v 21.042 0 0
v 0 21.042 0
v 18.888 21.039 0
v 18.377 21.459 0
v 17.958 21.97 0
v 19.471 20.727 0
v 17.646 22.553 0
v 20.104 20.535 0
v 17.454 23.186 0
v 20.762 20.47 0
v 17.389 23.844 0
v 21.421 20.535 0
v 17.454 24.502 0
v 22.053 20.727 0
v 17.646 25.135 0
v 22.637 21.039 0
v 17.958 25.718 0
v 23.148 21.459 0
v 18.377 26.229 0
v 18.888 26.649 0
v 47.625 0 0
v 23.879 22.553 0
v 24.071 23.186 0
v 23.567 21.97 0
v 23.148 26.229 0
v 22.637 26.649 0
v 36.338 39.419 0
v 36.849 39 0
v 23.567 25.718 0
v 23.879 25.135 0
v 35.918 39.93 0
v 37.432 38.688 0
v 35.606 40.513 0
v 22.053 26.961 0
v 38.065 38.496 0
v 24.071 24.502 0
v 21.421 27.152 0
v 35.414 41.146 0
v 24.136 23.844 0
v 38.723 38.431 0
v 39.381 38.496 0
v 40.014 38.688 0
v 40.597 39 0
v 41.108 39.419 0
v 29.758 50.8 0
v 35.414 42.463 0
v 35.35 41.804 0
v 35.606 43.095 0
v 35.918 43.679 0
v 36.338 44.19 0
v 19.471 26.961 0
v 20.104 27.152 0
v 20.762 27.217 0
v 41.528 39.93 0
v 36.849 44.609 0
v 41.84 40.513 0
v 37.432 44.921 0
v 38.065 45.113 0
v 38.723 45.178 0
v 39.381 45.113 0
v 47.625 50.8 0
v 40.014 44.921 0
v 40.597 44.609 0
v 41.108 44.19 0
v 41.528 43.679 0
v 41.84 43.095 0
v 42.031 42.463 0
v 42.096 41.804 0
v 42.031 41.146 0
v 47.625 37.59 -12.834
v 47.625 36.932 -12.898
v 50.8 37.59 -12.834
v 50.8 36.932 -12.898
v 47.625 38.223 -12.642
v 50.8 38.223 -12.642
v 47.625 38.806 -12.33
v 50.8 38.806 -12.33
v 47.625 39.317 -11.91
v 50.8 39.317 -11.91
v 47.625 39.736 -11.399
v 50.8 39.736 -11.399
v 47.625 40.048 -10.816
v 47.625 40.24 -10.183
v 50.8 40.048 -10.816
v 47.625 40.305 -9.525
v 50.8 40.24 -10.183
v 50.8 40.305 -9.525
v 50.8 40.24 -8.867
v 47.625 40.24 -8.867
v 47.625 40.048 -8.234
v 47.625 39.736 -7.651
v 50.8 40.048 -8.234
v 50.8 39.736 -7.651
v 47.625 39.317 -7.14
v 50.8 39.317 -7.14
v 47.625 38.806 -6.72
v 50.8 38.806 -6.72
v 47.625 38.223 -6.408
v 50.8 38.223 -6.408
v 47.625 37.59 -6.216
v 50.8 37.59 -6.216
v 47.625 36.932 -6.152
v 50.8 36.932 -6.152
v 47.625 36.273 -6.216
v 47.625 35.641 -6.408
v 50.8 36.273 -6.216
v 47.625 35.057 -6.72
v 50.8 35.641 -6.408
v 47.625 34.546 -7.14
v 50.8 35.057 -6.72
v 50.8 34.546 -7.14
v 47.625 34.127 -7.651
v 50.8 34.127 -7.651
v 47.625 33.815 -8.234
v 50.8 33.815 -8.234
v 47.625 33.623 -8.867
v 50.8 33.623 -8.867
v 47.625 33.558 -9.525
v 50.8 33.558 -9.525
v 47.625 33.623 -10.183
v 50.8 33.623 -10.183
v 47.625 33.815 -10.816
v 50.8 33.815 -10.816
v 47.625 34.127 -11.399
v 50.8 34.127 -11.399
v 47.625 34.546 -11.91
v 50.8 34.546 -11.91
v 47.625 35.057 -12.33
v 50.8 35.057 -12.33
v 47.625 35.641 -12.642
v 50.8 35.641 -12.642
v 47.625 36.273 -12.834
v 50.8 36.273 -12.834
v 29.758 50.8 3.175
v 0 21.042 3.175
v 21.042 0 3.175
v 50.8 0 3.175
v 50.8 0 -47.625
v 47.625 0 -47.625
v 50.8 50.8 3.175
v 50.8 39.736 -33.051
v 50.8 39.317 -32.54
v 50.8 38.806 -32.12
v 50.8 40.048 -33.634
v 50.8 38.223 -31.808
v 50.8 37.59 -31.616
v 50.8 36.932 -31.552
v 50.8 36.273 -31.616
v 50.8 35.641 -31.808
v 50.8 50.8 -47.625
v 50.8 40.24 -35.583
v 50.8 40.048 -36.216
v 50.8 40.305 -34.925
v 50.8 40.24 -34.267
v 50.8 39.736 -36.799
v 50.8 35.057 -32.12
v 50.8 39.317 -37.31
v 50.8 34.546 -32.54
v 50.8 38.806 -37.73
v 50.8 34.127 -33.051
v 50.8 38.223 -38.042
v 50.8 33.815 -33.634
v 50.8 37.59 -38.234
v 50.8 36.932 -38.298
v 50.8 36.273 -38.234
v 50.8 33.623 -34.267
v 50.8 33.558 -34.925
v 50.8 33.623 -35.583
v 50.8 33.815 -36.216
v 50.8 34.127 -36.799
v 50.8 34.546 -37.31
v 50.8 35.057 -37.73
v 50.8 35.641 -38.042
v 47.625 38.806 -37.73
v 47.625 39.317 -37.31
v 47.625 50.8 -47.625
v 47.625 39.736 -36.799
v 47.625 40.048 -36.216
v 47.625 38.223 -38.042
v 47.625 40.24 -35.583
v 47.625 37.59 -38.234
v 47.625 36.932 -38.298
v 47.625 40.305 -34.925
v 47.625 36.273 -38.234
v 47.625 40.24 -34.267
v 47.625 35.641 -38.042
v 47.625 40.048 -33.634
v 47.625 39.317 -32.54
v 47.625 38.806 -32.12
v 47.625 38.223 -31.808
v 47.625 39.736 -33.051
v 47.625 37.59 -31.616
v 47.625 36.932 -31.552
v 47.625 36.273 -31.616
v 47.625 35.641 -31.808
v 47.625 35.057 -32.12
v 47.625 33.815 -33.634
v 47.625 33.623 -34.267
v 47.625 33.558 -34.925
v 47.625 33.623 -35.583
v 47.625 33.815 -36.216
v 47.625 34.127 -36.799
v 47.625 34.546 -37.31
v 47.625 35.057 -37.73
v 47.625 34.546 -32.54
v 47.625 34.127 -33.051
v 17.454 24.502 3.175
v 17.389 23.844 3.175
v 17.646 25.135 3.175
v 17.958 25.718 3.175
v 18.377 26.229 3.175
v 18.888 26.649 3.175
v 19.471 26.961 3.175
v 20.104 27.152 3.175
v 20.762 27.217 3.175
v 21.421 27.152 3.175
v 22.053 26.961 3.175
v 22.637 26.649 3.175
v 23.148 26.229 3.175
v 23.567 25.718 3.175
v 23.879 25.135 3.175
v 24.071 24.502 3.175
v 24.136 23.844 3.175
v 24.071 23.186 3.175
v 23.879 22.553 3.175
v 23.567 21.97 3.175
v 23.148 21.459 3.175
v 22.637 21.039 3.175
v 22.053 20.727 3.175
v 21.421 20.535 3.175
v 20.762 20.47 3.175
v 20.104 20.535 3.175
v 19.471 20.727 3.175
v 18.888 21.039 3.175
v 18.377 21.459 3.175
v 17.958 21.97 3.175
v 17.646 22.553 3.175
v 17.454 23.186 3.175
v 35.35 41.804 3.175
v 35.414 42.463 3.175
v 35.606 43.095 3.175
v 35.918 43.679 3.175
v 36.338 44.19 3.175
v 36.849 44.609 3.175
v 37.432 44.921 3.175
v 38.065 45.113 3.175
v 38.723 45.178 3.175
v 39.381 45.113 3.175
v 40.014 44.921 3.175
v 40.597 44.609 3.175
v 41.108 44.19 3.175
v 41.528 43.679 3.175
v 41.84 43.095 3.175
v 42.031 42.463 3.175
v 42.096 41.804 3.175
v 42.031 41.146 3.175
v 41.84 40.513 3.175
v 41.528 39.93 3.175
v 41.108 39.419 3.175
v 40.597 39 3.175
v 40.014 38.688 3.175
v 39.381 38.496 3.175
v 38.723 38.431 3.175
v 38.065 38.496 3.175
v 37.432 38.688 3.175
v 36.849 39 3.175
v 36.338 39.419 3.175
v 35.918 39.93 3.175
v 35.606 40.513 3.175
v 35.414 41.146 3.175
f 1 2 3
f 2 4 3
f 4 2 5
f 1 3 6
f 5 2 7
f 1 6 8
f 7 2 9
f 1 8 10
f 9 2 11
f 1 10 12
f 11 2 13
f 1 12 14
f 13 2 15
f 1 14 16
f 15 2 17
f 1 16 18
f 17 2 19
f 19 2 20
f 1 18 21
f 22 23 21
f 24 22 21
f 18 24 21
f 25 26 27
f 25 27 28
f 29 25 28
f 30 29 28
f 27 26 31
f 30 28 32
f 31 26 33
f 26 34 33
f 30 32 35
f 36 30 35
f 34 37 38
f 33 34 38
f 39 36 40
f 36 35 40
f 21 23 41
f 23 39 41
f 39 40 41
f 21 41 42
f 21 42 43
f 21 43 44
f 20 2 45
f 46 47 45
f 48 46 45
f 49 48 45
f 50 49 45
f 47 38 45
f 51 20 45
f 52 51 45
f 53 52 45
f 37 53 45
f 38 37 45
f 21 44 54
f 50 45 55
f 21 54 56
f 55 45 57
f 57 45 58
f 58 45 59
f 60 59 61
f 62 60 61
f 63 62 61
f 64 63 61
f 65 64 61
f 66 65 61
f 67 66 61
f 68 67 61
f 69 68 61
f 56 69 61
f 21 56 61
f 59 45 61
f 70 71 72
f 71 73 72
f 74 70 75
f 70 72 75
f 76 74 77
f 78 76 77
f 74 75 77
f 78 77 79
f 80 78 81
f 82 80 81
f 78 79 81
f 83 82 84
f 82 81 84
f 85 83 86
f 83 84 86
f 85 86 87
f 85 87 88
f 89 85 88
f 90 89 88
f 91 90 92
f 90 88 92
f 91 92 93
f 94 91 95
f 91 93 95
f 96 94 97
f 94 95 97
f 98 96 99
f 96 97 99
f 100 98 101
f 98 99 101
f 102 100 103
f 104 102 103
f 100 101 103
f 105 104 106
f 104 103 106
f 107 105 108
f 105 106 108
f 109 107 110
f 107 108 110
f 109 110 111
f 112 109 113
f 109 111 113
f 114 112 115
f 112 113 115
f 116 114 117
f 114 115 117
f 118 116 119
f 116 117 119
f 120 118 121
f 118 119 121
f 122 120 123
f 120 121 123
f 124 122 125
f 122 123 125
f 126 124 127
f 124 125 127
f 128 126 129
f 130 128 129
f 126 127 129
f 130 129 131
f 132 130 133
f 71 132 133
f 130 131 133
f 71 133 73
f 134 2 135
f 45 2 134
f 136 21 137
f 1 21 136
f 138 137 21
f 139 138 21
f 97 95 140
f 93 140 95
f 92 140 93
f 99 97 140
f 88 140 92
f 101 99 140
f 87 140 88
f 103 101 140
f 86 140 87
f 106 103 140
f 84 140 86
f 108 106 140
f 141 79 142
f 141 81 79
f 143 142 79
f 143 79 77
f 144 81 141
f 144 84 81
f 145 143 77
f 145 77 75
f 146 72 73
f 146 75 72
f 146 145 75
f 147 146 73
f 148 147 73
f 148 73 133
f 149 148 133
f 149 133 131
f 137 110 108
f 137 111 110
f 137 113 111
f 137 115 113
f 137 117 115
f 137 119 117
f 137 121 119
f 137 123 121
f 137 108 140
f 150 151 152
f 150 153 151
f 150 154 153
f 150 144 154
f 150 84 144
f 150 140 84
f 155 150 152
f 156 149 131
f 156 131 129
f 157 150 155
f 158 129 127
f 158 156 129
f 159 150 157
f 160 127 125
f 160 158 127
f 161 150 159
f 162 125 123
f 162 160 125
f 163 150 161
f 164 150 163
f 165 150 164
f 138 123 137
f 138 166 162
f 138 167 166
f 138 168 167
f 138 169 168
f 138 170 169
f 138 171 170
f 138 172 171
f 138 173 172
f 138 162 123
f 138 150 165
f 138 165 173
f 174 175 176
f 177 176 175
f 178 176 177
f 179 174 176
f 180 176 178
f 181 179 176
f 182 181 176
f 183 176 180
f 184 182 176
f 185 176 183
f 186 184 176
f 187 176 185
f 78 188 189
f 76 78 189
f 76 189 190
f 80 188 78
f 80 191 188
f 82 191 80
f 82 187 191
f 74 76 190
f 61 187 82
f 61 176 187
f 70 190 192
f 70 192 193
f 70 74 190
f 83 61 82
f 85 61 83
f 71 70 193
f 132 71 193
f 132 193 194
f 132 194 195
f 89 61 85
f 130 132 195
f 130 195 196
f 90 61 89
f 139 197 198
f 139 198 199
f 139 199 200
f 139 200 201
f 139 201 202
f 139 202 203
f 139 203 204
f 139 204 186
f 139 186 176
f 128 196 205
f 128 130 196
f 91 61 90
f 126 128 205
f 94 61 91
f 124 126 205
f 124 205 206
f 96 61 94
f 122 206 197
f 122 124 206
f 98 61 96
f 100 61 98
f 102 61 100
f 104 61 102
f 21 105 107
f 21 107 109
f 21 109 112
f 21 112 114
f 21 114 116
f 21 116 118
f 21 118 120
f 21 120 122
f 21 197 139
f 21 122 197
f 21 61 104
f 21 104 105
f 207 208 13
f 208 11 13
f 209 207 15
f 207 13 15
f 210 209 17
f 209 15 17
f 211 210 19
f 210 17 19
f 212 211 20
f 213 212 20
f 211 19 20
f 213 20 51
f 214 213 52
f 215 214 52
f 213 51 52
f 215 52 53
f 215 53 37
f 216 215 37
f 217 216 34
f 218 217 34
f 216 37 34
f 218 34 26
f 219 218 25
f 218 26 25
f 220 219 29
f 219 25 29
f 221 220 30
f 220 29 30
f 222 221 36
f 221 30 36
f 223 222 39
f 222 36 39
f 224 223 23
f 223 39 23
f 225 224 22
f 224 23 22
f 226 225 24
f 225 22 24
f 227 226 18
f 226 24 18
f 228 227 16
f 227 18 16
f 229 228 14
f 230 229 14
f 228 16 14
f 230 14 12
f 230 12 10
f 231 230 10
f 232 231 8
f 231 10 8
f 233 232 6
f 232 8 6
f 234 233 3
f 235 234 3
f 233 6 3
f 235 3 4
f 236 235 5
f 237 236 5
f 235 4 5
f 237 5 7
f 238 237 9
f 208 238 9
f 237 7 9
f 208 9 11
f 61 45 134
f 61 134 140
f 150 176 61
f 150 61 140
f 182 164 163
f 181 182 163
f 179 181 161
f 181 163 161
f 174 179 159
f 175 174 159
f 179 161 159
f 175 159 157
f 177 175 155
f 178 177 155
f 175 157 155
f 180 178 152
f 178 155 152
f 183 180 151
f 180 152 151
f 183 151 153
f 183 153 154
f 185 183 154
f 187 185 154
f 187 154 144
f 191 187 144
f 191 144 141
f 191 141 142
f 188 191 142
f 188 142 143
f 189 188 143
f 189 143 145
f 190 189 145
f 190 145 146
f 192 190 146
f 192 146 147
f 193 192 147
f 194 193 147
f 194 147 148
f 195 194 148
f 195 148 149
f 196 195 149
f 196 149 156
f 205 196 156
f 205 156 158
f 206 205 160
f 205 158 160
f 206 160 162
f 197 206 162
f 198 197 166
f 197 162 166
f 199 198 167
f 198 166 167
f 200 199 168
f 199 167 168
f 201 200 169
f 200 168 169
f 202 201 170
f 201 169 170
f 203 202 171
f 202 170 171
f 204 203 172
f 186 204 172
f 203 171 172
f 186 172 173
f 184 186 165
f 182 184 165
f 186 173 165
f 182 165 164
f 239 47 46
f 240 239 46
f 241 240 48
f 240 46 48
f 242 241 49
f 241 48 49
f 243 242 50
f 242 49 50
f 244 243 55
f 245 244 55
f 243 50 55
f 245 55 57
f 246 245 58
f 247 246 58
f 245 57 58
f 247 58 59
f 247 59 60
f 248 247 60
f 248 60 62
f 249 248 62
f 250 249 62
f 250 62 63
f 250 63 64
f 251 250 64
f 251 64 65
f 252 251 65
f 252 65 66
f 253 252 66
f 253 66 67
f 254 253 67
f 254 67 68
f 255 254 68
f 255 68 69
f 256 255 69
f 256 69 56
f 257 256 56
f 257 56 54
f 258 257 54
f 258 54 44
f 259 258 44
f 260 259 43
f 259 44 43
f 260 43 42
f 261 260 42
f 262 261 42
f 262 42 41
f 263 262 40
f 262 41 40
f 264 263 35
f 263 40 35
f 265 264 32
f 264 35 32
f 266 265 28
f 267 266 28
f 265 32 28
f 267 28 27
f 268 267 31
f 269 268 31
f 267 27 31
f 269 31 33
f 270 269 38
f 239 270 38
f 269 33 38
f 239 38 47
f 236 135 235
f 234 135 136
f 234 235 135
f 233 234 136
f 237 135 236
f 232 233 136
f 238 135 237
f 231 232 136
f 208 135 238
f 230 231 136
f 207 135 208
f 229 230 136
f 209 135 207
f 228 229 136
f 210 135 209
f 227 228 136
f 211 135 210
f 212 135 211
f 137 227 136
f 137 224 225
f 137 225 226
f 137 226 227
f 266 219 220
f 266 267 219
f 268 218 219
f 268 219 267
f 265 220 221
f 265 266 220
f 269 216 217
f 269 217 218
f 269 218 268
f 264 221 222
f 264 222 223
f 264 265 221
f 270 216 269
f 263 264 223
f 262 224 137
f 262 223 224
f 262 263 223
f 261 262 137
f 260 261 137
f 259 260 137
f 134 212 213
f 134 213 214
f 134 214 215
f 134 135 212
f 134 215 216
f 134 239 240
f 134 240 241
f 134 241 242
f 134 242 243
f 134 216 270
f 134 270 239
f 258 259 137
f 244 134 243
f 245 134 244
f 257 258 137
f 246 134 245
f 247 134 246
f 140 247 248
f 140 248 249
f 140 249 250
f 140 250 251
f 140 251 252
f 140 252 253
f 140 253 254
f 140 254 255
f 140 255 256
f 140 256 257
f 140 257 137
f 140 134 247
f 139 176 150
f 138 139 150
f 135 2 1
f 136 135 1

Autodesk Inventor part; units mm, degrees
ref_plane "YZ Plane" through (0, 0, 0) normal (1, 0, 0) x (0, 1, 0)
ref_plane "XZ Plane" through (0, 0, 0) normal (0, 1, 0) x (-1, 0, 0)
ref_plane "XY Plane" through (0, 0, 0) normal (0, 0, 1) x (1, 0, 0)
sketch "Sketch1" plane through (0, 0, 0) normal (0, 0, 1) x (1, 0, 0)
  line L0 (0, 0) -> (0, 21.042)
  line L1 (0, 21.042) -> (29.758, 50.8)
  line L2 (29.758, 50.8) -> (50.8, 50.8)
  line L3 (50.8, 50.8) -> (50.8, 0)
  line L4 (50.8, 0) -> (0, 0)
  dimension "d0" = 50.8
  dimension "d2" = 50.8
  dimension "d3" = 50.8
  dimension "d4" = 135
extrude "Extrusion1" add sketch "Sketch1" along normal blind 3.175
sketch "Sketch2" plane through (0, 0, 3.175) normal (0, 0, 1) x (1, 0, 0)
  line L0 (50.8, 0) -> (50.8, 50.8) projected
  line L1 (0, 0) -> (50.8, 0) projected
  line L2 (50.8, 50.8) -> (47.625, 50.8)
  line L3 (47.625, 50.8) -> (47.625, 0)
  line L4 (47.625, 0) -> (50.8, 0)
  line L5 (50.8, 0) -> (50.8, 50.8)
  dimension "d7" = 3.175
extrude "Extrusion2" add sketch "Sketch2" against normal blind 50.8
sketch "Sketch3" plane through (50.8, 0, 3.175) normal (1, 0, 0) x (0, 0, -1)
  circle A0 centre (38.1, 36.9316) radius 3.3734
  circle A1 centre (12.7, 36.9316) radius 3.3734
  line L0 (0, 50.8) -> (50.8, 50.8) projected
  line L1 (0, 0) -> (0, 50.8) projected
  point P0 (3.175, 0)
  dimension "d10" = 6.7469
  dimension "d11" = 6.7469
  dimension "d12" = 13.8684
  dimension "d13" = 13.8684
  dimension "d14" = 12.7
  dimension "d15" = 25.4
extrude "Extrusion3" cut sketch "Sketch3" against normal blind 3.175
sketch "Sketch4" plane through (0, 0, 0) normal (0, 0, -1) x (-1, 0, 0)
  line L0 (0, 0) -> (0, 21.042) projected
  line L1 (0, 21.042) -> (-21.042, 0)
  line L2 (-47.625, 0) -> (0, 0) projected
  line L3 (0, 21.042) -> (-29.758, 50.8) projected
  line L4 (0, 21.042) -> (0, 0)
  line L5 (-21.042, 0) -> (0, 0)
  circle A0 centre (-20.7624, 23.8439) radius 3.3734
  circle A1 centre (-38.7229, 41.8044) radius 3.3734
  dimension "d18" = 16.6624
  dimension "d19" = 12.7
  dimension "d20" = 12.7
  dimension "d21" = 6.7469
  dimension "d22" = 25.4
extrude "Extrusion4" cut sketch "Sketch4" against normal blind 3.175
properties part number "bottom left rail gusset" material "Aluminum 6061"
